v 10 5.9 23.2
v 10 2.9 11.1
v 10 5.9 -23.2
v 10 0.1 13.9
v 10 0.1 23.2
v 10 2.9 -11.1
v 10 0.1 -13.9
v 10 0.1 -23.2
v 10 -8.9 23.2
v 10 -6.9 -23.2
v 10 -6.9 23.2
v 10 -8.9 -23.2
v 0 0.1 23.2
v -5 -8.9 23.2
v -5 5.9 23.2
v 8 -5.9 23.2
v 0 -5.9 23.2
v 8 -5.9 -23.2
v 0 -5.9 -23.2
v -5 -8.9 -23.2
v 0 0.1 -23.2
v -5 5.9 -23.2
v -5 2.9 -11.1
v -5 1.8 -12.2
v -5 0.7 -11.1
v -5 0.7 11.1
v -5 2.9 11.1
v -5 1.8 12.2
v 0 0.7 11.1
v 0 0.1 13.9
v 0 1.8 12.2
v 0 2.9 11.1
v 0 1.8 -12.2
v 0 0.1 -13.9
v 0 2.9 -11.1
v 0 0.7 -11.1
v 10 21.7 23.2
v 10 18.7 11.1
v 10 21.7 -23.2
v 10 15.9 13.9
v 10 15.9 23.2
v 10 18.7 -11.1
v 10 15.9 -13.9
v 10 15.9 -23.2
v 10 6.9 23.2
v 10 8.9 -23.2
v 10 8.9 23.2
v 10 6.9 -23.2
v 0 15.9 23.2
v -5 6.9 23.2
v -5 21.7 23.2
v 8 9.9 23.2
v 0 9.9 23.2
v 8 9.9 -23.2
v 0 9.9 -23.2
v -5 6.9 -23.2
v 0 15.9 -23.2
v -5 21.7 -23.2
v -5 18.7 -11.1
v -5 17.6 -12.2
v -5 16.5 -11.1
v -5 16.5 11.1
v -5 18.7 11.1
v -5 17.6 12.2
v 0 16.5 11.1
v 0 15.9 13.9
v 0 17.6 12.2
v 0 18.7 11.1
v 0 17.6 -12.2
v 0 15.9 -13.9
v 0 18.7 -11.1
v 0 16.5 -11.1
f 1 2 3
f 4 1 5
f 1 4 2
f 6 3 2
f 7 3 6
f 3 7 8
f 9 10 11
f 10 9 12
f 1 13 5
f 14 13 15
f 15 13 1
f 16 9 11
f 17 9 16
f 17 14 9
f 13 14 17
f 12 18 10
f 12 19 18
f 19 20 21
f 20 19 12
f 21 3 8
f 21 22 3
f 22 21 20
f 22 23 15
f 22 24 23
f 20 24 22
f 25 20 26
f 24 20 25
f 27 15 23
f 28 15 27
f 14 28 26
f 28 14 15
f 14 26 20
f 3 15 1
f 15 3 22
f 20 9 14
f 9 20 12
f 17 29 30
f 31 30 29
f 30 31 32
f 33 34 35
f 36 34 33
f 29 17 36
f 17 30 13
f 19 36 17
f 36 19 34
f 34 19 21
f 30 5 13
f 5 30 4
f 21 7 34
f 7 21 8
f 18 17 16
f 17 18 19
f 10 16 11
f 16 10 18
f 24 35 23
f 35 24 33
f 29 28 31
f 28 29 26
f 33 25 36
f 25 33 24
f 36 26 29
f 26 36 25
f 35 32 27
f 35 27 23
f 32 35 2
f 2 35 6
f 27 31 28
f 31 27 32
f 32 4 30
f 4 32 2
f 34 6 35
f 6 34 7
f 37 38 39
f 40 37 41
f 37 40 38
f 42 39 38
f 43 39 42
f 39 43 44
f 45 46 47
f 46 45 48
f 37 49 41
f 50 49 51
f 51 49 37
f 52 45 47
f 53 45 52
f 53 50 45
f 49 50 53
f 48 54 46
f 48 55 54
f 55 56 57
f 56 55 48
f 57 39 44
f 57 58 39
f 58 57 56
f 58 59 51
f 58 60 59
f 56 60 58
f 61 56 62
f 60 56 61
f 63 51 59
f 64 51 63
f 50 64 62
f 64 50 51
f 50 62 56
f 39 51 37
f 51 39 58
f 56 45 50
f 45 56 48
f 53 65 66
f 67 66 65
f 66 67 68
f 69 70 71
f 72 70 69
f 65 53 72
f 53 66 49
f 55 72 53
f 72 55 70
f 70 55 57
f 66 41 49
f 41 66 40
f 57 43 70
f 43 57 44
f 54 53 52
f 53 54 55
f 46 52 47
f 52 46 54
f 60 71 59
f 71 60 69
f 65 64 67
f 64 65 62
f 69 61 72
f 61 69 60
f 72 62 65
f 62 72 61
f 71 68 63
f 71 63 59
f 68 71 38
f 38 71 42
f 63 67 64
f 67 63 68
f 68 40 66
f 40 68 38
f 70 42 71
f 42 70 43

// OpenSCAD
// preview[view:east, tilt:top diagonal]

/*[Parameters]*/

metal_bar_thickness = 2.0;      //
metal_bar_width = 22.0; //
raft_thickness = 0.8;   //
bed_thickness = 5.8;   //
clearance = 0.1;        //[0.0:0.0mm,0.1:0.1mm,0.2:0.2mm,0.3:0.3mm,0.4:0.4mm]
quantity = 2;   //[1:1,2:2,3:3,4:4]
inner_length = 10.0;    //
outer_length = 5.0;    //

/*[Hidden]*/

module anti_warping_jig() {
	fn=36;
	plate_thickness = 3.0;
	plate_side_width = 10.0;
	adj=0.1;

	all_height = metal_bar_thickness + raft_thickness + bed_thickness + clearance*2 + plate_thickness*2;
	all_width = inner_length + outer_length;
	all_depth = metal_bar_width + metal_bar_thickness*2 + clearance*4 + plate_side_width*2;

	plate_bevel_width = inner_length >= 4 ? 2 : ( inner_length >= 2 ? inner_length - 2 : 0 );
	plate_bevel_height = plate_thickness >= 2 ? 1 : ( plate_thickness >= 1 ? plate_thickness - 1 : 0 );

	//side_bevel_outer = outer_length >= 4 ? 2 : ( outer_length >= 2 ? outer_length - 2 : 0 );
	//side_bevel_inner = plate_side_width >= 4 ? 2 : ( plate_side_width >= 2 ? plate_side_width - 2 : 0 );


	for ( q = [0:quantity-1] ) {

		translate([0,q*(all_height+1.0),0]) {
			intersection() {
				union() {

					difference() {

						translate([
							-outer_length
							,-bed_thickness - clearance - plate_thickness
							,-all_depth/2
						]) {
							cube([
								all_width
								,all_height
								,all_depth
							]);
						}

						translate([
							0
							,-bed_thickness - clearance
							,-all_depth/2 - adj
						]) {
							cube([
								inner_length + adj
								,bed_thickness + clearance*2
								,all_depth + adj*2
							]);
						}

						translate([
							0
							,0
							,-all_depth/2 - adj
						]) {

							linear_extrude(height=all_depth + adj*2,center=false,convex=10) {
								polygon(points=[
									[ inner_length - plate_bevel_width , -bed_thickness - clearance + adj ]
									,[ inner_length - plate_bevel_width , -bed_thickness - clearance ]
									,[ inner_length , -bed_thickness - clearance - plate_bevel_height ]
									,[ inner_length + adj , -bed_thickness - clearance - plate_bevel_height ]
									,[ inner_length + adj , -bed_thickness - clearance + adj ]
								]);
							}

						}


						translate([
							adj
							,-clearance
							,0
						]) {

							rotate([0,-90,0]) {

								linear_extrude(height=outer_length + adj*2 , center=false,convex=10) {
									polygon(points=[
										[ metal_bar_width/2 + clearance , raft_thickness + metal_bar_thickness + clearance*2 ]
										,[ metal_bar_width/2 + clearance + metal_bar_thickness/2 + clearance , raft_thickness + metal_bar_thickness/2 + clearance ]
										,[ metal_bar_width/2 + clearance , raft_thickness ]
										,[ -metal_bar_width/2 - clearance , raft_thickness ]
										,[ -metal_bar_width/2 - clearance - metal_bar_thickness/2 - clearance , raft_thickness + metal_bar_thickness/2 + clearance ]
										,[ -metal_bar_width/2 - clearance , raft_thickness + metal_bar_thickness + clearance*2 ]
									]);
								}

							}

						}

						translate([
							0
							,-clearance
							,0
						]) {

							rotate([0,90,0]) {

								linear_extrude(height=inner_length + adj,center=false,convex=10) {
									polygon(points=[
										[ metal_bar_width/2 + clearance , raft_thickness + metal_bar_thickness + clearance*2 ]
										,[ metal_bar_width/2 + raft_thickness + metal_bar_thickness + clearance*2 + clearance , 0 ]
										,[ metal_bar_width/2 + raft_thickness + metal_bar_thickness + clearance*2 + clearance , - adj ]
										,[ -metal_bar_width/2 - raft_thickness - metal_bar_thickness - clearance*2 - clearance , - adj ]
										,[ -metal_bar_width/2 - raft_thickness - metal_bar_thickness - clearance*2 - clearance , 0 ]
										,[ -metal_bar_width/2 - clearance , raft_thickness + metal_bar_thickness + clearance*2 ]
									]);
								}

							}

						}











					}
				}
			}
		}


	}

}

anti_warping_jig();
